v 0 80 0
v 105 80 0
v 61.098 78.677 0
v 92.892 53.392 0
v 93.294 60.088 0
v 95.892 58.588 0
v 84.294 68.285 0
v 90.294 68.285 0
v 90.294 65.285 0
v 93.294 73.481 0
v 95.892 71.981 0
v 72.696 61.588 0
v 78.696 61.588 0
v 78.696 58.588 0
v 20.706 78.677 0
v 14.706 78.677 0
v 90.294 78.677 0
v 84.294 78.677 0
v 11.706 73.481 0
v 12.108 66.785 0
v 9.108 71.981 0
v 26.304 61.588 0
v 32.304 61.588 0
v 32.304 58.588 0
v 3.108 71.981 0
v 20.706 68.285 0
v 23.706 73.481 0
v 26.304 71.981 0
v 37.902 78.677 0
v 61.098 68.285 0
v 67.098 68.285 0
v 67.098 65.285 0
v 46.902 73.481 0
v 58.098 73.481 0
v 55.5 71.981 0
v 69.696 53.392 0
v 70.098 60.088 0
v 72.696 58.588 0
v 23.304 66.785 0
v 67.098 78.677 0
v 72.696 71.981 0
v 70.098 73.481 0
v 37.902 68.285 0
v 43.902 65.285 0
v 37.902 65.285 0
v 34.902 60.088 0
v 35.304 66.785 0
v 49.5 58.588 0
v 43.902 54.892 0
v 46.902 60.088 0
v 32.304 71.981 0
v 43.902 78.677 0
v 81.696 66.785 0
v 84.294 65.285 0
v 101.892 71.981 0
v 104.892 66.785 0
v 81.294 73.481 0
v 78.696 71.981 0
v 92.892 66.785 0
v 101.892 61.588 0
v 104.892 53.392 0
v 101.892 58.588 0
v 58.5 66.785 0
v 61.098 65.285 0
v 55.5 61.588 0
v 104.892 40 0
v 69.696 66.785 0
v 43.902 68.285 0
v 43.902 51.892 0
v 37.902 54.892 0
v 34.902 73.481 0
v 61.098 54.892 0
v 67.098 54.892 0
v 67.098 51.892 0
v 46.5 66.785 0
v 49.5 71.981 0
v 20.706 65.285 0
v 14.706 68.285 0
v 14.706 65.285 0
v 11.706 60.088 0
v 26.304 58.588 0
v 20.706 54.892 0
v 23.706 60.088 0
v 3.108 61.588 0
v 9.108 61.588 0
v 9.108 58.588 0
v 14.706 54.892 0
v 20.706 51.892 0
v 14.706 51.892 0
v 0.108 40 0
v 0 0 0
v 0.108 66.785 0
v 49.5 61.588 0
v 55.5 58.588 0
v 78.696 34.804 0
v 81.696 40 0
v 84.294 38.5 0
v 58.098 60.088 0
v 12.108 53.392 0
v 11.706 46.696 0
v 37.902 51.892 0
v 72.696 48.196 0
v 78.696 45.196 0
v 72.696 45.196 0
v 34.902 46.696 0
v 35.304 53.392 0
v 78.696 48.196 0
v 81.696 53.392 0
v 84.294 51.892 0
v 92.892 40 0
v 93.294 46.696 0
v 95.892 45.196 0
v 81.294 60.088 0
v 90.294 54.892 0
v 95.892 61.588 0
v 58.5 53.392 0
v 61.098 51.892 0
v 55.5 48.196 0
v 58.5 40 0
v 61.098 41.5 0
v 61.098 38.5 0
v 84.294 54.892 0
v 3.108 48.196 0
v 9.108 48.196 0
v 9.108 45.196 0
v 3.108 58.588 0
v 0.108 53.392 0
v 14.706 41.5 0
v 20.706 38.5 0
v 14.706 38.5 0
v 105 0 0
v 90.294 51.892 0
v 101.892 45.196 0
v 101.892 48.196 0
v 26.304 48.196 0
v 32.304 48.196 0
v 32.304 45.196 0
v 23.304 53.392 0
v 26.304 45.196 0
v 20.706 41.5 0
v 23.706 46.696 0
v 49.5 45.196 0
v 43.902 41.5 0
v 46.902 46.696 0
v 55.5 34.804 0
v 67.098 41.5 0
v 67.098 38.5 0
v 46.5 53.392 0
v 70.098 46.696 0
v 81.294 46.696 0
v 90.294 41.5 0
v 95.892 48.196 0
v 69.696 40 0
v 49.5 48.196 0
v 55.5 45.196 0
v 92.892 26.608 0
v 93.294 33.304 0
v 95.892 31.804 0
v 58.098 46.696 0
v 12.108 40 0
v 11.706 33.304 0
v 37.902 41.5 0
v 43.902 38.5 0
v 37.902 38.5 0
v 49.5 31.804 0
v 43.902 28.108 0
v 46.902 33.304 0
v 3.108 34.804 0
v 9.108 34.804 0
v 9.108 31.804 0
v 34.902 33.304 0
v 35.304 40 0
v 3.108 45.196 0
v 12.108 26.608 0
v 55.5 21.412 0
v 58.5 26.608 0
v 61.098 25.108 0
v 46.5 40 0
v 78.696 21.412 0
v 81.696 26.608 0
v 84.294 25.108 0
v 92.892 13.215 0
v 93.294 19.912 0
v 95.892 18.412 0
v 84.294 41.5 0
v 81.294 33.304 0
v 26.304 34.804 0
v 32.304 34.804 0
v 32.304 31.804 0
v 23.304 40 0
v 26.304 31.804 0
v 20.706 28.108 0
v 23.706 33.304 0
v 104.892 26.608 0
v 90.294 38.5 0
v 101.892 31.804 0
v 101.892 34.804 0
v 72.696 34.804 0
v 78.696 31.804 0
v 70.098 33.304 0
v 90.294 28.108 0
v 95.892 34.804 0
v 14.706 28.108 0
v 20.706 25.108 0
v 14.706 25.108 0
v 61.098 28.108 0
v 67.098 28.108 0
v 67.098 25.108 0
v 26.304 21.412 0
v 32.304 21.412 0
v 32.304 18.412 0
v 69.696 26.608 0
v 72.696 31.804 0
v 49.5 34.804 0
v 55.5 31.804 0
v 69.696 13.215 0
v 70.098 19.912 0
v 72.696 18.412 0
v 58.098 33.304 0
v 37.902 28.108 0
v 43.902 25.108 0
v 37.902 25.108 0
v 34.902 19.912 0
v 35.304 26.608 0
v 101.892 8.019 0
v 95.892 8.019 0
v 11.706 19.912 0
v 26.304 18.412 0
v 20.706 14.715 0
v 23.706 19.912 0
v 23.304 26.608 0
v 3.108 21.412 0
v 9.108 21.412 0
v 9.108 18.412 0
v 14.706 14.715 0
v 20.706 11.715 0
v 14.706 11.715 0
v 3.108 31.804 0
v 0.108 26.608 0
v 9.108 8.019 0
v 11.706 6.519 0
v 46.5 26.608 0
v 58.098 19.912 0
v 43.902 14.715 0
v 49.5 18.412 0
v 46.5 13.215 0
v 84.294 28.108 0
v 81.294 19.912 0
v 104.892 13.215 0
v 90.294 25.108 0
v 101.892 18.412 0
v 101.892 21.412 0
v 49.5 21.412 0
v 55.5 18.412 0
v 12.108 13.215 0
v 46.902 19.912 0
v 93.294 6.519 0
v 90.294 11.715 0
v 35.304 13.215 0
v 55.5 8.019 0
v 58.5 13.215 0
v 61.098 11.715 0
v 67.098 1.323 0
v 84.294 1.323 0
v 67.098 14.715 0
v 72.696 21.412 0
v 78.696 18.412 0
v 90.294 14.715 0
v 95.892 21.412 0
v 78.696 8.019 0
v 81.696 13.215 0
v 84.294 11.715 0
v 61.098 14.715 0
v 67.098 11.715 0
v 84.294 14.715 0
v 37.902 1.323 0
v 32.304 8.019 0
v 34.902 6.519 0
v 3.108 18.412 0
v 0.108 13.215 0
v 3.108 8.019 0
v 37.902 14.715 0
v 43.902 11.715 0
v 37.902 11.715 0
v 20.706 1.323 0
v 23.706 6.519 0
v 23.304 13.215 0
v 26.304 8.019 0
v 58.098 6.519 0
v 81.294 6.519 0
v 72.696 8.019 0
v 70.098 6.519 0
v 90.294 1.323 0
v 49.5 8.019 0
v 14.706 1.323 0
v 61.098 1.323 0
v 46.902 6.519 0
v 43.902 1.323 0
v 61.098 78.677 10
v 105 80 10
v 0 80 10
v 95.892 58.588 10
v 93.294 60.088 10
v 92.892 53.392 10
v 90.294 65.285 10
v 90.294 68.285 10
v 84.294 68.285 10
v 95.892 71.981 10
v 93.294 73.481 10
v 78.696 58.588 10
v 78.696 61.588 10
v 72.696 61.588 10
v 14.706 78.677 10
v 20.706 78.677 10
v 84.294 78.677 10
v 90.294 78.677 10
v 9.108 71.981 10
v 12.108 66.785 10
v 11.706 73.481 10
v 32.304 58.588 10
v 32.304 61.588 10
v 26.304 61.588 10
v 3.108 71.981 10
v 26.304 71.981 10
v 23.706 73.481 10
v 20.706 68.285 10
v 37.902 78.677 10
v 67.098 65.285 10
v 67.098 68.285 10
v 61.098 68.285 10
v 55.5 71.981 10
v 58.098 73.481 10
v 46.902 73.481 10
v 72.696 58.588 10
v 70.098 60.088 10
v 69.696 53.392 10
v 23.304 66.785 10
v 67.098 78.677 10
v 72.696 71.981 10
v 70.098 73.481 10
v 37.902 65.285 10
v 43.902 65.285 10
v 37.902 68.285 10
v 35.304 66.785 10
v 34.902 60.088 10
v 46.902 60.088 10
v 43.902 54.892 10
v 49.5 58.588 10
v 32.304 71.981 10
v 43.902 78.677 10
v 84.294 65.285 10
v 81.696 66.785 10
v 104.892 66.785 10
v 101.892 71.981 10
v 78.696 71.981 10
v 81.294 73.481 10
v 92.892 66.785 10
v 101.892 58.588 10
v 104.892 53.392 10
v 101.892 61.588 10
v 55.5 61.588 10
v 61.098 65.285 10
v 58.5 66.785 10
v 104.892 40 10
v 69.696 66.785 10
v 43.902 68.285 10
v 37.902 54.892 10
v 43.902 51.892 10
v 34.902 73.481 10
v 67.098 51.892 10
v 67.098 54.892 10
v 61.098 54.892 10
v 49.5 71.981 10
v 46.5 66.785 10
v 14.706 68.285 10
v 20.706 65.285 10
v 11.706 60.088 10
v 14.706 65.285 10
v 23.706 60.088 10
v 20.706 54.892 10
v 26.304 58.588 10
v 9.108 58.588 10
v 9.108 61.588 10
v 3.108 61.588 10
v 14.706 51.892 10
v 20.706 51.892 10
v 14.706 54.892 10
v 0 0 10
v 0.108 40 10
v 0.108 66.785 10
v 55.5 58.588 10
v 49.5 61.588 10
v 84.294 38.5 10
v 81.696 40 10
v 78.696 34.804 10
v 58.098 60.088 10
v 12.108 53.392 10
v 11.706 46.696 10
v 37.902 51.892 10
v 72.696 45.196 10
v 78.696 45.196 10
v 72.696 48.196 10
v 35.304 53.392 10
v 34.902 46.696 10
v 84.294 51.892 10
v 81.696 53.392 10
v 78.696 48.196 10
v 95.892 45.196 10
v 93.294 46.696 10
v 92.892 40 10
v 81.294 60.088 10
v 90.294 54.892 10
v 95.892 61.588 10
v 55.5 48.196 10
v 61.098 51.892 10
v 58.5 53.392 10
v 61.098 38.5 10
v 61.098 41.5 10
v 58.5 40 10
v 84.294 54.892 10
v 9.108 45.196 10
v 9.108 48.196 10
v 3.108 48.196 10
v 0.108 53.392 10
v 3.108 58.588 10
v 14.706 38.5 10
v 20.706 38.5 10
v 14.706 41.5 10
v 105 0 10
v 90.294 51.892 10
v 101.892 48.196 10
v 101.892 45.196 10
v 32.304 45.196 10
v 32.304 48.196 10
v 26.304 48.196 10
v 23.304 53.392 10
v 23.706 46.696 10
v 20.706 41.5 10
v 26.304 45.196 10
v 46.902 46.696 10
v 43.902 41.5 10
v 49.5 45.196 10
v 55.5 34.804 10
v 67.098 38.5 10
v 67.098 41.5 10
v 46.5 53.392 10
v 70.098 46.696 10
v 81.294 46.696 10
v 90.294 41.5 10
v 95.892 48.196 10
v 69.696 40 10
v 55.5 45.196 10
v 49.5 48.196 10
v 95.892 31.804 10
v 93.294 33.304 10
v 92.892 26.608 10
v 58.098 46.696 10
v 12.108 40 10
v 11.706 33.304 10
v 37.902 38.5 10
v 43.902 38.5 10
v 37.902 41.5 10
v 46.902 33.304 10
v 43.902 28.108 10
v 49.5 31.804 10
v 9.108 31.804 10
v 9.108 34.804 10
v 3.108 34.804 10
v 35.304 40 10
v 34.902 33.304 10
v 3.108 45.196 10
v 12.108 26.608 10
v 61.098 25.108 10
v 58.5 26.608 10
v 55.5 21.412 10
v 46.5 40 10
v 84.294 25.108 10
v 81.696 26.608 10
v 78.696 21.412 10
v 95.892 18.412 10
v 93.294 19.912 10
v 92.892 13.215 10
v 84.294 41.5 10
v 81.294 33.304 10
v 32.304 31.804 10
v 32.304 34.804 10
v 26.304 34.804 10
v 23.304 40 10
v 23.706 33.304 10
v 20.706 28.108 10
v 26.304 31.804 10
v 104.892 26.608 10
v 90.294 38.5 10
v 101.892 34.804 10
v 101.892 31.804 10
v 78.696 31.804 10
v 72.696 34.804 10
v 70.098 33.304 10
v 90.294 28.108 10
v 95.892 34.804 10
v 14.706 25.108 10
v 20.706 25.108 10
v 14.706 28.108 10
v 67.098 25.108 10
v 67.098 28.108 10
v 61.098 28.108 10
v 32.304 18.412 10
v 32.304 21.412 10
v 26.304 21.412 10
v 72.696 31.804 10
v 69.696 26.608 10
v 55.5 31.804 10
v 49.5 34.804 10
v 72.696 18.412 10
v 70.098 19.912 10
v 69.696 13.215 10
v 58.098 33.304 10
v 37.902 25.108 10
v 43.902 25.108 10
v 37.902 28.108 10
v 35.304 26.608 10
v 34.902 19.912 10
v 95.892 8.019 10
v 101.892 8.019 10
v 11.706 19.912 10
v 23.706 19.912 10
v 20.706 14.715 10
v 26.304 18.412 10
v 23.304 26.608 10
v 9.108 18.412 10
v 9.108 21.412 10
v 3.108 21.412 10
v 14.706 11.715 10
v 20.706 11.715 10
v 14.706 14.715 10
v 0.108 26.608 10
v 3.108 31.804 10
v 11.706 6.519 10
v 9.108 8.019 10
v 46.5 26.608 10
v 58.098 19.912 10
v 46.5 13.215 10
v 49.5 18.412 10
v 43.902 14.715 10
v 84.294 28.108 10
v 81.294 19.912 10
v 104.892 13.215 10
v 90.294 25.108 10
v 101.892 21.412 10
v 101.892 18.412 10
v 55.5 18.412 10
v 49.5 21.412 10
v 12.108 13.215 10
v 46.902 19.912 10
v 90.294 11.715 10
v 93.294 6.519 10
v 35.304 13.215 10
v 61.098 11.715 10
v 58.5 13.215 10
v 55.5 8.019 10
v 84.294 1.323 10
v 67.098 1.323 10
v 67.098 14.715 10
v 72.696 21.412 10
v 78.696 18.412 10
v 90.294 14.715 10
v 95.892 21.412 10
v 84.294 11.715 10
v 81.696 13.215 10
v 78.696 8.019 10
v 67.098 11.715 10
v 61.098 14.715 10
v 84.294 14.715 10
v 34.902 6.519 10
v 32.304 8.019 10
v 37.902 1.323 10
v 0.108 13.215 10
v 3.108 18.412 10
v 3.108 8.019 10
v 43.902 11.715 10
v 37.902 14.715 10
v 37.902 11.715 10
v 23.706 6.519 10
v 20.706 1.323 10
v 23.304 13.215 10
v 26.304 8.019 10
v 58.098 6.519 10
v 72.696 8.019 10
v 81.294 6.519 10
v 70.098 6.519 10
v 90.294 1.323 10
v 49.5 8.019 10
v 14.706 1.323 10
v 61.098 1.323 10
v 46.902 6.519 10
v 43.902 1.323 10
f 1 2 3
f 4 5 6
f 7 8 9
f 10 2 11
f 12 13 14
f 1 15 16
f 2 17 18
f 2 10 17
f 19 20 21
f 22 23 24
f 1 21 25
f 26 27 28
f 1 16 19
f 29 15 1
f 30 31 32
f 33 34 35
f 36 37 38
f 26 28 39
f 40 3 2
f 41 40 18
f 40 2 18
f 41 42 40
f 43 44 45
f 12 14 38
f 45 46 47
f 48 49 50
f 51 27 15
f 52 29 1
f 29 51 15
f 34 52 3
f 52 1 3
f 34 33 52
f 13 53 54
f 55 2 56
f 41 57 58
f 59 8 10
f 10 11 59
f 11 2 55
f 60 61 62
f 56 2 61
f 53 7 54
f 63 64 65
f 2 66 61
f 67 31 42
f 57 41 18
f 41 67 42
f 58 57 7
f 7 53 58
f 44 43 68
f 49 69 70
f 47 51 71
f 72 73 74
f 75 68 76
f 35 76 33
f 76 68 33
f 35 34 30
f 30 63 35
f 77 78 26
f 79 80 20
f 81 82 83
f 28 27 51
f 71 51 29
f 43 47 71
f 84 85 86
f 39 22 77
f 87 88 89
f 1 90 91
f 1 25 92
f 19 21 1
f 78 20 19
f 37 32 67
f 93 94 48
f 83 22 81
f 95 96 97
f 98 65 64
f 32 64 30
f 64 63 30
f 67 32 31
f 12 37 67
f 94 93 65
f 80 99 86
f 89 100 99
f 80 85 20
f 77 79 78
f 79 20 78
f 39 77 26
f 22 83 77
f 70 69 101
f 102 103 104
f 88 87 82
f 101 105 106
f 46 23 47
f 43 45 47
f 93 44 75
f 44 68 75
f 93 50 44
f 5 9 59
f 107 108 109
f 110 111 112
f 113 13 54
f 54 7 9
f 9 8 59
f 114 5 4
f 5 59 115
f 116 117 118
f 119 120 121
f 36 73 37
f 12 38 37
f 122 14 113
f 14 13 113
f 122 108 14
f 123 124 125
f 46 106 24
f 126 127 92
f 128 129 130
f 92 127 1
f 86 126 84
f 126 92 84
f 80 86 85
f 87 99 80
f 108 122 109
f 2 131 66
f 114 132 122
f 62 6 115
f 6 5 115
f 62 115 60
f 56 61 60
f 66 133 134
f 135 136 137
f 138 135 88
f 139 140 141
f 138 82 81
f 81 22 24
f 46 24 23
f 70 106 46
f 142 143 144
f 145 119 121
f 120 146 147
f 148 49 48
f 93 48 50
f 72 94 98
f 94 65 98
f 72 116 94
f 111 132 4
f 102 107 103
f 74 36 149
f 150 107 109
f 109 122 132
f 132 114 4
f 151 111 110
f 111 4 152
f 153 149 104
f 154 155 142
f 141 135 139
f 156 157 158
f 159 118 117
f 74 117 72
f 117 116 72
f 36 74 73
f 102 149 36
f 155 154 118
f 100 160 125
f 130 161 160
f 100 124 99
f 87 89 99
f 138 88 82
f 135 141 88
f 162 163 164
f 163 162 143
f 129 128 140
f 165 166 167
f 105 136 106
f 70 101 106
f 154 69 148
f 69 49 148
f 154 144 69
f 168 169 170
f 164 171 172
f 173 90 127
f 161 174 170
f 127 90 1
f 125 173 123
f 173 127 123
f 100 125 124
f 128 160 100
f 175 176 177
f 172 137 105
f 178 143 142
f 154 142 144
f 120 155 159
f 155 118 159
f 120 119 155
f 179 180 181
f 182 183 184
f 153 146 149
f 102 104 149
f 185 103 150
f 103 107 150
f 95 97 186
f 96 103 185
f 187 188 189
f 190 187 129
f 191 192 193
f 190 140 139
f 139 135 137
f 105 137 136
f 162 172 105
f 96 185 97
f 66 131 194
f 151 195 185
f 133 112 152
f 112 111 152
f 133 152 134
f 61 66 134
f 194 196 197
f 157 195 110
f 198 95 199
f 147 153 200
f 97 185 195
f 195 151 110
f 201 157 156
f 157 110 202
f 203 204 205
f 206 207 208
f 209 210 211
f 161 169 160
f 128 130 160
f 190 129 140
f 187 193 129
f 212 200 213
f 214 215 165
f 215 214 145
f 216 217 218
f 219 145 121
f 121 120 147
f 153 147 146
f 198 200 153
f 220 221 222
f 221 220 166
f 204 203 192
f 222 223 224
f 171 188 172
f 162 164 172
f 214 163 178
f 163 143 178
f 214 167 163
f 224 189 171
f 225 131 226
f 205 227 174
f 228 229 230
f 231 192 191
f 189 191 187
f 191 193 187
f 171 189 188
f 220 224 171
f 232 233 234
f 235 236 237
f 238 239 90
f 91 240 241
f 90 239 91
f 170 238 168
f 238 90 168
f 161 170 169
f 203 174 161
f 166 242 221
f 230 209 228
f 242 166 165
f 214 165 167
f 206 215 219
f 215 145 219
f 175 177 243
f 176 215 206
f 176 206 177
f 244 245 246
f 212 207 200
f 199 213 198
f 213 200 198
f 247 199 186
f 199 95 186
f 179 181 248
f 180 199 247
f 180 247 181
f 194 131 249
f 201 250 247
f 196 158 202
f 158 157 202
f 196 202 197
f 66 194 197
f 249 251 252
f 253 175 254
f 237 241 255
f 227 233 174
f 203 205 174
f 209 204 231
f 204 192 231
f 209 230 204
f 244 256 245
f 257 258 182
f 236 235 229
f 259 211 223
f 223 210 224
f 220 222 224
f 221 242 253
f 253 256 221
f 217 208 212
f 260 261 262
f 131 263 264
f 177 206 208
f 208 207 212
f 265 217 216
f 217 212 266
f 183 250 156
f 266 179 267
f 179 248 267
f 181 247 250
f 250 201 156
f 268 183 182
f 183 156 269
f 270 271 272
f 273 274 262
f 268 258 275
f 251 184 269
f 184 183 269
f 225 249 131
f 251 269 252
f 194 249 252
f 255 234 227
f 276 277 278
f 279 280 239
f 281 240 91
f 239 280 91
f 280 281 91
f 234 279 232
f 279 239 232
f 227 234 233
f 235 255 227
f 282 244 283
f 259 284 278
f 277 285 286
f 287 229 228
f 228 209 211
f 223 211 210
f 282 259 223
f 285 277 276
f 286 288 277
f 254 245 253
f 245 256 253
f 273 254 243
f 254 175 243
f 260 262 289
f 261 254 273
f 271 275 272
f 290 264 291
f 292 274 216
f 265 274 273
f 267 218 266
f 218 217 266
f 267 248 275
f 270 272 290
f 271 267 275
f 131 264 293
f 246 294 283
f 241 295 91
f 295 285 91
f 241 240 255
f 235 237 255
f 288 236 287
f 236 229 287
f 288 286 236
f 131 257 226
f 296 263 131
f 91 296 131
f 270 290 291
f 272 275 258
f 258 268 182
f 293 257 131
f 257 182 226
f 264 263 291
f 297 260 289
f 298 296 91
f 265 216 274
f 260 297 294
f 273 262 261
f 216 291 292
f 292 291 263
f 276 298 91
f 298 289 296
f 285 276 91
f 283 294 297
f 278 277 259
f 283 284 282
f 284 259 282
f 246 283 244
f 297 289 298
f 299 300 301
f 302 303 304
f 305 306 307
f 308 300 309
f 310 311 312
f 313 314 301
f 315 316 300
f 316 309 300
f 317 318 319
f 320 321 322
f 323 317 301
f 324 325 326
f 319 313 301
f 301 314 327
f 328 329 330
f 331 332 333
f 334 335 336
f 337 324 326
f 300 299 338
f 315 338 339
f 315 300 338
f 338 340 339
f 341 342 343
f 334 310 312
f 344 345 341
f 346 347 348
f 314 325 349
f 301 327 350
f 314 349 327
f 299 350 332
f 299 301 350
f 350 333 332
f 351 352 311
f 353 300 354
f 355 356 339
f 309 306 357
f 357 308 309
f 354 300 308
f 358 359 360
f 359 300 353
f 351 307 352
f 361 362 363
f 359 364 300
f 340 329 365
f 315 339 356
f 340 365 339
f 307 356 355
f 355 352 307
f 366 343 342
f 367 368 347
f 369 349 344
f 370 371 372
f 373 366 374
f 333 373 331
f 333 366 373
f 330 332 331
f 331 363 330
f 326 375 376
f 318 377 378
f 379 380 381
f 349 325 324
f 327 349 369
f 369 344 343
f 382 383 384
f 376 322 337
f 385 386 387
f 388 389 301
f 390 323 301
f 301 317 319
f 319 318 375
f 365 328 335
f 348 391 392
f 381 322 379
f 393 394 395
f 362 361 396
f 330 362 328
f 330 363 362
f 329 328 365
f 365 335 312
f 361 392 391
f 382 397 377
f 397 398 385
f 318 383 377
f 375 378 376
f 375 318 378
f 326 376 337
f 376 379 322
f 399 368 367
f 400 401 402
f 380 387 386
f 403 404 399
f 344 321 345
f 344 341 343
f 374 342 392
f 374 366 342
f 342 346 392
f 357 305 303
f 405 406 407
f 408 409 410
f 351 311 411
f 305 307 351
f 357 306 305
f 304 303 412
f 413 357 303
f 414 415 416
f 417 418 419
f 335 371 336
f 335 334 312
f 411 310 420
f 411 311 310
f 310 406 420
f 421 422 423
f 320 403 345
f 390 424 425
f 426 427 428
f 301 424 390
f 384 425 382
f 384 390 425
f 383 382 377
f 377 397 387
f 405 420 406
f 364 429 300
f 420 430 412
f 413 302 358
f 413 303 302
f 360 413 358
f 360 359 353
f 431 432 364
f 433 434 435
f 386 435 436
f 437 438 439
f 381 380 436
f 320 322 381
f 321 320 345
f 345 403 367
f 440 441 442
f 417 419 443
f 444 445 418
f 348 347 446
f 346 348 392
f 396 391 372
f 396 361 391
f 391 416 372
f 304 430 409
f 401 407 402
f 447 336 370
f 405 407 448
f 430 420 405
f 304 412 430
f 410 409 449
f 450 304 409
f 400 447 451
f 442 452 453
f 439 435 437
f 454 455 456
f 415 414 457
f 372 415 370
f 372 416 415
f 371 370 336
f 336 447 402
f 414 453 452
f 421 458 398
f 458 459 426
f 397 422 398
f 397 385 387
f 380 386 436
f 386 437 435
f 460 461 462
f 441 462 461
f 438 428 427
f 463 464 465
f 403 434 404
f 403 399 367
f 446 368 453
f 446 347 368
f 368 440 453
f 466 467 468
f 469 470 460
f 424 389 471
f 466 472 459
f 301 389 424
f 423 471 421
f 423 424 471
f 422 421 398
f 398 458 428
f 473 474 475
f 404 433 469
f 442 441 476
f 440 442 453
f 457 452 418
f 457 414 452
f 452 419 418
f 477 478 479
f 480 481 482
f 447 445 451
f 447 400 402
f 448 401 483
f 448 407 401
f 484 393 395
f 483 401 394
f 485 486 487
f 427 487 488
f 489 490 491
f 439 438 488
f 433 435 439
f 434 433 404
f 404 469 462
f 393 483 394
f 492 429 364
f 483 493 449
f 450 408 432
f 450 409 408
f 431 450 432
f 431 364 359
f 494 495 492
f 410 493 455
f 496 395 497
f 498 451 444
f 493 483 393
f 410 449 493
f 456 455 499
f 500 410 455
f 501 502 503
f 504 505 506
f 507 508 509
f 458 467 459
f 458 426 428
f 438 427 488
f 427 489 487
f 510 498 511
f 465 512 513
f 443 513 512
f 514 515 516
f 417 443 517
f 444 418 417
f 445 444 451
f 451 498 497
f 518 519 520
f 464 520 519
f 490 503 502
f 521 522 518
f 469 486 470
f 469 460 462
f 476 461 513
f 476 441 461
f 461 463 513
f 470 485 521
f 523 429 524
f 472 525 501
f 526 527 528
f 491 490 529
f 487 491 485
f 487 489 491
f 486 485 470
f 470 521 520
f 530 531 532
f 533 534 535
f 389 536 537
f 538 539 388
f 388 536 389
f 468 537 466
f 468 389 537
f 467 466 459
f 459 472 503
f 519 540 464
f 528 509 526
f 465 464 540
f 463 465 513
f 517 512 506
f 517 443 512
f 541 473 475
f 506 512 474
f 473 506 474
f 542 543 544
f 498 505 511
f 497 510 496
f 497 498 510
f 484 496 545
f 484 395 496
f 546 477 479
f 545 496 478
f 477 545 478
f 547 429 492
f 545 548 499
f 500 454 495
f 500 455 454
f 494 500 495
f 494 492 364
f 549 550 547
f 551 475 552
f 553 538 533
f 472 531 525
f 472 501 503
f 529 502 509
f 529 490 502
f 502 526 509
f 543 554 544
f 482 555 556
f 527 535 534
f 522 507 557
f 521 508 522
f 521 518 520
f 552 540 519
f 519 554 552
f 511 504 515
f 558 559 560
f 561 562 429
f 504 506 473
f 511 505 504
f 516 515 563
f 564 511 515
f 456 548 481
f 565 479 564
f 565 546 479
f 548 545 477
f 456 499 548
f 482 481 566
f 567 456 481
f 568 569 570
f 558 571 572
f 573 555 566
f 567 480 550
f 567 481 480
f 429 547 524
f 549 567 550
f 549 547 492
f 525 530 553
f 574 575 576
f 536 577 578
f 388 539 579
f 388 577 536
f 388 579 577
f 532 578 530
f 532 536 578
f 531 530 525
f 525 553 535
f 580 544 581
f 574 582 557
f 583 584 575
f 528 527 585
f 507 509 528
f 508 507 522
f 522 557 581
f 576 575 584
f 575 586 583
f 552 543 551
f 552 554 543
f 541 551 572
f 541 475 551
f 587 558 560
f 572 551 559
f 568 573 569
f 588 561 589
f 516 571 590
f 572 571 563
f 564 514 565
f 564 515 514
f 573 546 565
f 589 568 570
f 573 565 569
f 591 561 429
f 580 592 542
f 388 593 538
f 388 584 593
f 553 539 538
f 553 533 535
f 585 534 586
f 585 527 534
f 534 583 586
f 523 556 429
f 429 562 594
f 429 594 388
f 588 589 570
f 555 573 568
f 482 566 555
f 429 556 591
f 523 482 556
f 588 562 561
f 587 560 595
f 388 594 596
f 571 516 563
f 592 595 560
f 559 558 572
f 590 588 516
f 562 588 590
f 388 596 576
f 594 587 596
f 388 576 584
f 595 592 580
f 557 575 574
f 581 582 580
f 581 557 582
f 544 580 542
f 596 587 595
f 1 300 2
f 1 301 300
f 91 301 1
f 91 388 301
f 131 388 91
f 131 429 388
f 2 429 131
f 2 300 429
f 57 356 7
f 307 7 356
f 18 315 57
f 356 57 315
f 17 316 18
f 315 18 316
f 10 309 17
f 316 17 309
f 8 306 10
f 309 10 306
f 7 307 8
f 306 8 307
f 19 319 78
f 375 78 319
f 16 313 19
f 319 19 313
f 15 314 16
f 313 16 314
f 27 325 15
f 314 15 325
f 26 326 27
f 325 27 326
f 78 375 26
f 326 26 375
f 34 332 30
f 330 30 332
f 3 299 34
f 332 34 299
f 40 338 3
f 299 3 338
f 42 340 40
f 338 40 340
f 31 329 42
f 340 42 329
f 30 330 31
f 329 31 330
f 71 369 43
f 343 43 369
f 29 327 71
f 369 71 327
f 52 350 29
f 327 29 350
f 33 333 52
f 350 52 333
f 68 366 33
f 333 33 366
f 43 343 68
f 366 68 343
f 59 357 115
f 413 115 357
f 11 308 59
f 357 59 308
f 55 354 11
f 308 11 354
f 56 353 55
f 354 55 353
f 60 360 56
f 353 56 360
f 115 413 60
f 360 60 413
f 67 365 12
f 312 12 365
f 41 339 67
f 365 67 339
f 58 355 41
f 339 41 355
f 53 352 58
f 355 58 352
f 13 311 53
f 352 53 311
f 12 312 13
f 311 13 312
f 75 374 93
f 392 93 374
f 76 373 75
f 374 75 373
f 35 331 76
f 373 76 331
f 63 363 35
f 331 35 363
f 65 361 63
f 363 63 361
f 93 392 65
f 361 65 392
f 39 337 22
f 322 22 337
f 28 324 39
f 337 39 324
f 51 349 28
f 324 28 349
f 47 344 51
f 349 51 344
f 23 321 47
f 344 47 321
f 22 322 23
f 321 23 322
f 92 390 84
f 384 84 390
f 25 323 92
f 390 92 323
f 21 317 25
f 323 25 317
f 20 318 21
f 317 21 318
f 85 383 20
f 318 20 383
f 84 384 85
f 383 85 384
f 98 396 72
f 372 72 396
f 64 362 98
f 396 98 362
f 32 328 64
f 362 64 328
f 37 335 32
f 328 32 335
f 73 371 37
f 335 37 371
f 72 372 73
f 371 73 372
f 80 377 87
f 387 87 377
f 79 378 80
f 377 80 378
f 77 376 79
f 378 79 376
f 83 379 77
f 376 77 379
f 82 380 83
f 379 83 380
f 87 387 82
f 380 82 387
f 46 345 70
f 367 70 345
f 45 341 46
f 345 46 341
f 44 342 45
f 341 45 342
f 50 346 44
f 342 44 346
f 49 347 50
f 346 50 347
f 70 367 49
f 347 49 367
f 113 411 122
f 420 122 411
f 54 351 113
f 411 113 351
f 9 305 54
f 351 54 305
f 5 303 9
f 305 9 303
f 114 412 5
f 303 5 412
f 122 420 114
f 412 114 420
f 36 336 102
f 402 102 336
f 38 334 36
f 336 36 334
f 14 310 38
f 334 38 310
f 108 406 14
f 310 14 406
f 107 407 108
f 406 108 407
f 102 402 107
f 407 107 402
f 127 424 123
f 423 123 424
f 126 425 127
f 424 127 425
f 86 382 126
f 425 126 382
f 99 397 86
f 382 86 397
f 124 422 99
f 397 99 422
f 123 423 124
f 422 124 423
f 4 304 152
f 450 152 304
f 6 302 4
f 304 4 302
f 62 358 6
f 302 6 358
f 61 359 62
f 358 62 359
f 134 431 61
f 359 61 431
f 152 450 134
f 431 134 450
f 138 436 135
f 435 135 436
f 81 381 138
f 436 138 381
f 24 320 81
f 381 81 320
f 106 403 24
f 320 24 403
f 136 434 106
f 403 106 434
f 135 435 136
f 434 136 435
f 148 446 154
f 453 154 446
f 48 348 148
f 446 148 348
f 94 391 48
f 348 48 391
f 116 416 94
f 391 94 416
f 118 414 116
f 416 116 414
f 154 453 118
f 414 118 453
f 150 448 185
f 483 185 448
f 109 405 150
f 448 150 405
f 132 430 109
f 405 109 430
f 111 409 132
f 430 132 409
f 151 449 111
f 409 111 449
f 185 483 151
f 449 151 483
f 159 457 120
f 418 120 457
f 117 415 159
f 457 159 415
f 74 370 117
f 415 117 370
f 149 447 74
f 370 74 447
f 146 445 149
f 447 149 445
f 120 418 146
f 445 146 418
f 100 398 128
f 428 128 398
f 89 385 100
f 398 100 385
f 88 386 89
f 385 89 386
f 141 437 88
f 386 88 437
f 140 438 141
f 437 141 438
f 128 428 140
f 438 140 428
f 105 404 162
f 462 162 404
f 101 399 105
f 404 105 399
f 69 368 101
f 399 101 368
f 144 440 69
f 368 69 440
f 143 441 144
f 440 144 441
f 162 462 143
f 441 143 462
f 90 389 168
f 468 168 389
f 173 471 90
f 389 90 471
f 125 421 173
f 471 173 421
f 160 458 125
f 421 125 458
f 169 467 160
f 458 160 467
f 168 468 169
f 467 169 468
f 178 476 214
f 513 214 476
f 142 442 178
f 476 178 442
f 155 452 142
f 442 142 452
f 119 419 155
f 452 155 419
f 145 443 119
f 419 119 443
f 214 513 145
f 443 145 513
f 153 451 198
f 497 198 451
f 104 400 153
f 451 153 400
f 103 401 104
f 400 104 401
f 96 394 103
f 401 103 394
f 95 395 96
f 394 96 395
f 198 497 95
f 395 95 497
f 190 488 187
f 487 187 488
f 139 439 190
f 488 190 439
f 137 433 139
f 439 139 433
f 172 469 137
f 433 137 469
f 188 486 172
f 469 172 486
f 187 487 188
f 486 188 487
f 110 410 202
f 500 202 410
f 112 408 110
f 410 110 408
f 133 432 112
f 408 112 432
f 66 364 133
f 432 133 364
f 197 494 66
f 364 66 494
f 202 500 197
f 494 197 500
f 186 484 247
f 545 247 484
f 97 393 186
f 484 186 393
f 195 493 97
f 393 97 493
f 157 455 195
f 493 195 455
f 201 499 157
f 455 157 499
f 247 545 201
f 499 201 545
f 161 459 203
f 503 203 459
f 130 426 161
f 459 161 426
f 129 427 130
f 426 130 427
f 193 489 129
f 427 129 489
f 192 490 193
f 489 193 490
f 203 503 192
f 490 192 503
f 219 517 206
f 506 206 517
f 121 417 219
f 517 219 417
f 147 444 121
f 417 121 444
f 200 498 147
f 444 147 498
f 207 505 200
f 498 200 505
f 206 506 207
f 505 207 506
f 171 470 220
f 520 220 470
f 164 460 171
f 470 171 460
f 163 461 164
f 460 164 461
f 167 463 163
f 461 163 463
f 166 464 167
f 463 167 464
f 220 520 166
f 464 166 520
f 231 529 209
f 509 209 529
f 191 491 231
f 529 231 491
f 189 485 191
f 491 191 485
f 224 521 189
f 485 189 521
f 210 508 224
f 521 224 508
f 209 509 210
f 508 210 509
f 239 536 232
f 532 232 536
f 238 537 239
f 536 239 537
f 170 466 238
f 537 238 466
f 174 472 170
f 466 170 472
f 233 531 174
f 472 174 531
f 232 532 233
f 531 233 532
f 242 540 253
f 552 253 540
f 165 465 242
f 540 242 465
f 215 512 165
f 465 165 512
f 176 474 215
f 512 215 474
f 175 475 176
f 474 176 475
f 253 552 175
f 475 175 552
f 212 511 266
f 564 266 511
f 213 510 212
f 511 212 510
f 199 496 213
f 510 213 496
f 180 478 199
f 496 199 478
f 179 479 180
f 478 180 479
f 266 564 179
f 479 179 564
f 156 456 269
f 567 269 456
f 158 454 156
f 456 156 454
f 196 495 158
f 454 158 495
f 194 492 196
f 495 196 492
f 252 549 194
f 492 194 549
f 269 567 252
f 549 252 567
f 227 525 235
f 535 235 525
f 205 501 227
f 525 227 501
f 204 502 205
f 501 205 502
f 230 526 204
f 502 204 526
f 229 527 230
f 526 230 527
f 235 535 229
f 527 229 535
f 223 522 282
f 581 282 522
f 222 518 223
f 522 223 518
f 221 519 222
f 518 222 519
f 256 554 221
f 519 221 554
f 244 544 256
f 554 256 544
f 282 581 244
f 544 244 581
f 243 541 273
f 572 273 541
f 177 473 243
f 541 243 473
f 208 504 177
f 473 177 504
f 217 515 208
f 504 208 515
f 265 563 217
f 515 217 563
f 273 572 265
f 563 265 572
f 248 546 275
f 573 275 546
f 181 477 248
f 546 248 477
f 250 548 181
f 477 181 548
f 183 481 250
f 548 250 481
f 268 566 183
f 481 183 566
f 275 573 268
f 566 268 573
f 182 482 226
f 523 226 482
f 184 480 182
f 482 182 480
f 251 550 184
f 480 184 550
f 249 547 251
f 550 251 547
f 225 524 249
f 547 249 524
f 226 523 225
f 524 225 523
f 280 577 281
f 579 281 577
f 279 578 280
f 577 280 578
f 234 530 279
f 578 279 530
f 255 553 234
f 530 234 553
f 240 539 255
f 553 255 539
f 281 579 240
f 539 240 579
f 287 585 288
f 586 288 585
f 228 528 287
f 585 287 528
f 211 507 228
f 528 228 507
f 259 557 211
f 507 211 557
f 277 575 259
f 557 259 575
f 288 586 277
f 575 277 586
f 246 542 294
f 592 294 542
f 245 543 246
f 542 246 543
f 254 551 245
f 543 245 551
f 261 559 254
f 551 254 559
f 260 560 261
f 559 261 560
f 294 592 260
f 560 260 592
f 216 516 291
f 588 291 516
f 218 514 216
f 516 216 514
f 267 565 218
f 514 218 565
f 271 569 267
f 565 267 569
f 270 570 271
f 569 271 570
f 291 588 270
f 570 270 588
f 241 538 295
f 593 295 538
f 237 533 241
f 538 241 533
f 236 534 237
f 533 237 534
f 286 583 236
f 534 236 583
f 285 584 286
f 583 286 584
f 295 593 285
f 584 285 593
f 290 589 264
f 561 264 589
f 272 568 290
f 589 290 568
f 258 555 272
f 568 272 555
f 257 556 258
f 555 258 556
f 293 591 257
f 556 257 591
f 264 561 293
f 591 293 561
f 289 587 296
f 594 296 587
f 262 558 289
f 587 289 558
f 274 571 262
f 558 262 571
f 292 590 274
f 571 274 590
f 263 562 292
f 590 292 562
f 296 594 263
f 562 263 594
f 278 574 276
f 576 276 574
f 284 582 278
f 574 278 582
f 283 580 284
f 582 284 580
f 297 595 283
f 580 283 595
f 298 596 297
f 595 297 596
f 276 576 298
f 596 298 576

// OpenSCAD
// file: honeycomb.scad
/**
 * Honeycomb library
 * License: Creative Commons - Attribution
 * Copyright: Gael Lafond 2017
 * URL: https://www.thingiverse.com/thing:2484395
 *
 * Inspired from:
 *   https://www.thingiverse.com/thing:1763704
 */

// parametric honeycomb
module honeycomb(x, y, dia, wall, whole_only=false)  {
    // Diagram
    //          ______     ___
    //         /     /\     |
    //        / dia /  \    | smallDia
    //       /     /    \  _|_
    //       \          /   ____
    //        \        /   /
    //     ___ \______/   /
    // wall |            /
    //     _|_  ______   \
    //         /      \   \
    //        /        \   \
    //                 |---|
    //                   projWall
    //

    // a single filled hexagon
    module hexagon(xoff, yoff)  {
        radius = dia / 2;
        if (
                !whole_only || (
                    (xoff - radius >= -x/2 && xoff + radius <= x/2)
                    && (yoff - radius >= -y/2 && yoff + radius <= y/2)
                )
        ) {
            translate([xoff, yoff])
            circle(d=dia, $fn=6);
        }
    }

    smallDia = dia * cos(30);
    projWall = wall * cos(30);

    yStep = smallDia + wall;
    xStep = dia*3/2 + projWall*2;

    yStepsCount = ceil((y/2) / yStep);
    xStepsCount = ceil((x/2) / xStep);

    difference() {
        square([x, y]);
        translate([x/2, y/2])
        for (
                yOffset = [-yStep * yStepsCount : yStep : yStep * yStepsCount],
                xOffset = [-xStep * xStepsCount : xStep : xStep * xStepsCount]
        ) {
            hexagon(xOffset, yOffset);
            hexagon(xOffset + dia*3/4 + projWall, yOffset + (smallDia+wall)/2);
        }
    }
}
// main file
/**
 * Simple example of Honeycomb library usage
 * License: Creative Commons - Attribution
 * Copyright: Gael Lafond 2017
 * 
 * Inspired from:
 *   https://www.thingiverse.com/thing:1763704
 */

include <honeycomb.scad>

linear_extrude(10) {
	honeycomb(105, 80, 12, 3, whole_only=true);
}
